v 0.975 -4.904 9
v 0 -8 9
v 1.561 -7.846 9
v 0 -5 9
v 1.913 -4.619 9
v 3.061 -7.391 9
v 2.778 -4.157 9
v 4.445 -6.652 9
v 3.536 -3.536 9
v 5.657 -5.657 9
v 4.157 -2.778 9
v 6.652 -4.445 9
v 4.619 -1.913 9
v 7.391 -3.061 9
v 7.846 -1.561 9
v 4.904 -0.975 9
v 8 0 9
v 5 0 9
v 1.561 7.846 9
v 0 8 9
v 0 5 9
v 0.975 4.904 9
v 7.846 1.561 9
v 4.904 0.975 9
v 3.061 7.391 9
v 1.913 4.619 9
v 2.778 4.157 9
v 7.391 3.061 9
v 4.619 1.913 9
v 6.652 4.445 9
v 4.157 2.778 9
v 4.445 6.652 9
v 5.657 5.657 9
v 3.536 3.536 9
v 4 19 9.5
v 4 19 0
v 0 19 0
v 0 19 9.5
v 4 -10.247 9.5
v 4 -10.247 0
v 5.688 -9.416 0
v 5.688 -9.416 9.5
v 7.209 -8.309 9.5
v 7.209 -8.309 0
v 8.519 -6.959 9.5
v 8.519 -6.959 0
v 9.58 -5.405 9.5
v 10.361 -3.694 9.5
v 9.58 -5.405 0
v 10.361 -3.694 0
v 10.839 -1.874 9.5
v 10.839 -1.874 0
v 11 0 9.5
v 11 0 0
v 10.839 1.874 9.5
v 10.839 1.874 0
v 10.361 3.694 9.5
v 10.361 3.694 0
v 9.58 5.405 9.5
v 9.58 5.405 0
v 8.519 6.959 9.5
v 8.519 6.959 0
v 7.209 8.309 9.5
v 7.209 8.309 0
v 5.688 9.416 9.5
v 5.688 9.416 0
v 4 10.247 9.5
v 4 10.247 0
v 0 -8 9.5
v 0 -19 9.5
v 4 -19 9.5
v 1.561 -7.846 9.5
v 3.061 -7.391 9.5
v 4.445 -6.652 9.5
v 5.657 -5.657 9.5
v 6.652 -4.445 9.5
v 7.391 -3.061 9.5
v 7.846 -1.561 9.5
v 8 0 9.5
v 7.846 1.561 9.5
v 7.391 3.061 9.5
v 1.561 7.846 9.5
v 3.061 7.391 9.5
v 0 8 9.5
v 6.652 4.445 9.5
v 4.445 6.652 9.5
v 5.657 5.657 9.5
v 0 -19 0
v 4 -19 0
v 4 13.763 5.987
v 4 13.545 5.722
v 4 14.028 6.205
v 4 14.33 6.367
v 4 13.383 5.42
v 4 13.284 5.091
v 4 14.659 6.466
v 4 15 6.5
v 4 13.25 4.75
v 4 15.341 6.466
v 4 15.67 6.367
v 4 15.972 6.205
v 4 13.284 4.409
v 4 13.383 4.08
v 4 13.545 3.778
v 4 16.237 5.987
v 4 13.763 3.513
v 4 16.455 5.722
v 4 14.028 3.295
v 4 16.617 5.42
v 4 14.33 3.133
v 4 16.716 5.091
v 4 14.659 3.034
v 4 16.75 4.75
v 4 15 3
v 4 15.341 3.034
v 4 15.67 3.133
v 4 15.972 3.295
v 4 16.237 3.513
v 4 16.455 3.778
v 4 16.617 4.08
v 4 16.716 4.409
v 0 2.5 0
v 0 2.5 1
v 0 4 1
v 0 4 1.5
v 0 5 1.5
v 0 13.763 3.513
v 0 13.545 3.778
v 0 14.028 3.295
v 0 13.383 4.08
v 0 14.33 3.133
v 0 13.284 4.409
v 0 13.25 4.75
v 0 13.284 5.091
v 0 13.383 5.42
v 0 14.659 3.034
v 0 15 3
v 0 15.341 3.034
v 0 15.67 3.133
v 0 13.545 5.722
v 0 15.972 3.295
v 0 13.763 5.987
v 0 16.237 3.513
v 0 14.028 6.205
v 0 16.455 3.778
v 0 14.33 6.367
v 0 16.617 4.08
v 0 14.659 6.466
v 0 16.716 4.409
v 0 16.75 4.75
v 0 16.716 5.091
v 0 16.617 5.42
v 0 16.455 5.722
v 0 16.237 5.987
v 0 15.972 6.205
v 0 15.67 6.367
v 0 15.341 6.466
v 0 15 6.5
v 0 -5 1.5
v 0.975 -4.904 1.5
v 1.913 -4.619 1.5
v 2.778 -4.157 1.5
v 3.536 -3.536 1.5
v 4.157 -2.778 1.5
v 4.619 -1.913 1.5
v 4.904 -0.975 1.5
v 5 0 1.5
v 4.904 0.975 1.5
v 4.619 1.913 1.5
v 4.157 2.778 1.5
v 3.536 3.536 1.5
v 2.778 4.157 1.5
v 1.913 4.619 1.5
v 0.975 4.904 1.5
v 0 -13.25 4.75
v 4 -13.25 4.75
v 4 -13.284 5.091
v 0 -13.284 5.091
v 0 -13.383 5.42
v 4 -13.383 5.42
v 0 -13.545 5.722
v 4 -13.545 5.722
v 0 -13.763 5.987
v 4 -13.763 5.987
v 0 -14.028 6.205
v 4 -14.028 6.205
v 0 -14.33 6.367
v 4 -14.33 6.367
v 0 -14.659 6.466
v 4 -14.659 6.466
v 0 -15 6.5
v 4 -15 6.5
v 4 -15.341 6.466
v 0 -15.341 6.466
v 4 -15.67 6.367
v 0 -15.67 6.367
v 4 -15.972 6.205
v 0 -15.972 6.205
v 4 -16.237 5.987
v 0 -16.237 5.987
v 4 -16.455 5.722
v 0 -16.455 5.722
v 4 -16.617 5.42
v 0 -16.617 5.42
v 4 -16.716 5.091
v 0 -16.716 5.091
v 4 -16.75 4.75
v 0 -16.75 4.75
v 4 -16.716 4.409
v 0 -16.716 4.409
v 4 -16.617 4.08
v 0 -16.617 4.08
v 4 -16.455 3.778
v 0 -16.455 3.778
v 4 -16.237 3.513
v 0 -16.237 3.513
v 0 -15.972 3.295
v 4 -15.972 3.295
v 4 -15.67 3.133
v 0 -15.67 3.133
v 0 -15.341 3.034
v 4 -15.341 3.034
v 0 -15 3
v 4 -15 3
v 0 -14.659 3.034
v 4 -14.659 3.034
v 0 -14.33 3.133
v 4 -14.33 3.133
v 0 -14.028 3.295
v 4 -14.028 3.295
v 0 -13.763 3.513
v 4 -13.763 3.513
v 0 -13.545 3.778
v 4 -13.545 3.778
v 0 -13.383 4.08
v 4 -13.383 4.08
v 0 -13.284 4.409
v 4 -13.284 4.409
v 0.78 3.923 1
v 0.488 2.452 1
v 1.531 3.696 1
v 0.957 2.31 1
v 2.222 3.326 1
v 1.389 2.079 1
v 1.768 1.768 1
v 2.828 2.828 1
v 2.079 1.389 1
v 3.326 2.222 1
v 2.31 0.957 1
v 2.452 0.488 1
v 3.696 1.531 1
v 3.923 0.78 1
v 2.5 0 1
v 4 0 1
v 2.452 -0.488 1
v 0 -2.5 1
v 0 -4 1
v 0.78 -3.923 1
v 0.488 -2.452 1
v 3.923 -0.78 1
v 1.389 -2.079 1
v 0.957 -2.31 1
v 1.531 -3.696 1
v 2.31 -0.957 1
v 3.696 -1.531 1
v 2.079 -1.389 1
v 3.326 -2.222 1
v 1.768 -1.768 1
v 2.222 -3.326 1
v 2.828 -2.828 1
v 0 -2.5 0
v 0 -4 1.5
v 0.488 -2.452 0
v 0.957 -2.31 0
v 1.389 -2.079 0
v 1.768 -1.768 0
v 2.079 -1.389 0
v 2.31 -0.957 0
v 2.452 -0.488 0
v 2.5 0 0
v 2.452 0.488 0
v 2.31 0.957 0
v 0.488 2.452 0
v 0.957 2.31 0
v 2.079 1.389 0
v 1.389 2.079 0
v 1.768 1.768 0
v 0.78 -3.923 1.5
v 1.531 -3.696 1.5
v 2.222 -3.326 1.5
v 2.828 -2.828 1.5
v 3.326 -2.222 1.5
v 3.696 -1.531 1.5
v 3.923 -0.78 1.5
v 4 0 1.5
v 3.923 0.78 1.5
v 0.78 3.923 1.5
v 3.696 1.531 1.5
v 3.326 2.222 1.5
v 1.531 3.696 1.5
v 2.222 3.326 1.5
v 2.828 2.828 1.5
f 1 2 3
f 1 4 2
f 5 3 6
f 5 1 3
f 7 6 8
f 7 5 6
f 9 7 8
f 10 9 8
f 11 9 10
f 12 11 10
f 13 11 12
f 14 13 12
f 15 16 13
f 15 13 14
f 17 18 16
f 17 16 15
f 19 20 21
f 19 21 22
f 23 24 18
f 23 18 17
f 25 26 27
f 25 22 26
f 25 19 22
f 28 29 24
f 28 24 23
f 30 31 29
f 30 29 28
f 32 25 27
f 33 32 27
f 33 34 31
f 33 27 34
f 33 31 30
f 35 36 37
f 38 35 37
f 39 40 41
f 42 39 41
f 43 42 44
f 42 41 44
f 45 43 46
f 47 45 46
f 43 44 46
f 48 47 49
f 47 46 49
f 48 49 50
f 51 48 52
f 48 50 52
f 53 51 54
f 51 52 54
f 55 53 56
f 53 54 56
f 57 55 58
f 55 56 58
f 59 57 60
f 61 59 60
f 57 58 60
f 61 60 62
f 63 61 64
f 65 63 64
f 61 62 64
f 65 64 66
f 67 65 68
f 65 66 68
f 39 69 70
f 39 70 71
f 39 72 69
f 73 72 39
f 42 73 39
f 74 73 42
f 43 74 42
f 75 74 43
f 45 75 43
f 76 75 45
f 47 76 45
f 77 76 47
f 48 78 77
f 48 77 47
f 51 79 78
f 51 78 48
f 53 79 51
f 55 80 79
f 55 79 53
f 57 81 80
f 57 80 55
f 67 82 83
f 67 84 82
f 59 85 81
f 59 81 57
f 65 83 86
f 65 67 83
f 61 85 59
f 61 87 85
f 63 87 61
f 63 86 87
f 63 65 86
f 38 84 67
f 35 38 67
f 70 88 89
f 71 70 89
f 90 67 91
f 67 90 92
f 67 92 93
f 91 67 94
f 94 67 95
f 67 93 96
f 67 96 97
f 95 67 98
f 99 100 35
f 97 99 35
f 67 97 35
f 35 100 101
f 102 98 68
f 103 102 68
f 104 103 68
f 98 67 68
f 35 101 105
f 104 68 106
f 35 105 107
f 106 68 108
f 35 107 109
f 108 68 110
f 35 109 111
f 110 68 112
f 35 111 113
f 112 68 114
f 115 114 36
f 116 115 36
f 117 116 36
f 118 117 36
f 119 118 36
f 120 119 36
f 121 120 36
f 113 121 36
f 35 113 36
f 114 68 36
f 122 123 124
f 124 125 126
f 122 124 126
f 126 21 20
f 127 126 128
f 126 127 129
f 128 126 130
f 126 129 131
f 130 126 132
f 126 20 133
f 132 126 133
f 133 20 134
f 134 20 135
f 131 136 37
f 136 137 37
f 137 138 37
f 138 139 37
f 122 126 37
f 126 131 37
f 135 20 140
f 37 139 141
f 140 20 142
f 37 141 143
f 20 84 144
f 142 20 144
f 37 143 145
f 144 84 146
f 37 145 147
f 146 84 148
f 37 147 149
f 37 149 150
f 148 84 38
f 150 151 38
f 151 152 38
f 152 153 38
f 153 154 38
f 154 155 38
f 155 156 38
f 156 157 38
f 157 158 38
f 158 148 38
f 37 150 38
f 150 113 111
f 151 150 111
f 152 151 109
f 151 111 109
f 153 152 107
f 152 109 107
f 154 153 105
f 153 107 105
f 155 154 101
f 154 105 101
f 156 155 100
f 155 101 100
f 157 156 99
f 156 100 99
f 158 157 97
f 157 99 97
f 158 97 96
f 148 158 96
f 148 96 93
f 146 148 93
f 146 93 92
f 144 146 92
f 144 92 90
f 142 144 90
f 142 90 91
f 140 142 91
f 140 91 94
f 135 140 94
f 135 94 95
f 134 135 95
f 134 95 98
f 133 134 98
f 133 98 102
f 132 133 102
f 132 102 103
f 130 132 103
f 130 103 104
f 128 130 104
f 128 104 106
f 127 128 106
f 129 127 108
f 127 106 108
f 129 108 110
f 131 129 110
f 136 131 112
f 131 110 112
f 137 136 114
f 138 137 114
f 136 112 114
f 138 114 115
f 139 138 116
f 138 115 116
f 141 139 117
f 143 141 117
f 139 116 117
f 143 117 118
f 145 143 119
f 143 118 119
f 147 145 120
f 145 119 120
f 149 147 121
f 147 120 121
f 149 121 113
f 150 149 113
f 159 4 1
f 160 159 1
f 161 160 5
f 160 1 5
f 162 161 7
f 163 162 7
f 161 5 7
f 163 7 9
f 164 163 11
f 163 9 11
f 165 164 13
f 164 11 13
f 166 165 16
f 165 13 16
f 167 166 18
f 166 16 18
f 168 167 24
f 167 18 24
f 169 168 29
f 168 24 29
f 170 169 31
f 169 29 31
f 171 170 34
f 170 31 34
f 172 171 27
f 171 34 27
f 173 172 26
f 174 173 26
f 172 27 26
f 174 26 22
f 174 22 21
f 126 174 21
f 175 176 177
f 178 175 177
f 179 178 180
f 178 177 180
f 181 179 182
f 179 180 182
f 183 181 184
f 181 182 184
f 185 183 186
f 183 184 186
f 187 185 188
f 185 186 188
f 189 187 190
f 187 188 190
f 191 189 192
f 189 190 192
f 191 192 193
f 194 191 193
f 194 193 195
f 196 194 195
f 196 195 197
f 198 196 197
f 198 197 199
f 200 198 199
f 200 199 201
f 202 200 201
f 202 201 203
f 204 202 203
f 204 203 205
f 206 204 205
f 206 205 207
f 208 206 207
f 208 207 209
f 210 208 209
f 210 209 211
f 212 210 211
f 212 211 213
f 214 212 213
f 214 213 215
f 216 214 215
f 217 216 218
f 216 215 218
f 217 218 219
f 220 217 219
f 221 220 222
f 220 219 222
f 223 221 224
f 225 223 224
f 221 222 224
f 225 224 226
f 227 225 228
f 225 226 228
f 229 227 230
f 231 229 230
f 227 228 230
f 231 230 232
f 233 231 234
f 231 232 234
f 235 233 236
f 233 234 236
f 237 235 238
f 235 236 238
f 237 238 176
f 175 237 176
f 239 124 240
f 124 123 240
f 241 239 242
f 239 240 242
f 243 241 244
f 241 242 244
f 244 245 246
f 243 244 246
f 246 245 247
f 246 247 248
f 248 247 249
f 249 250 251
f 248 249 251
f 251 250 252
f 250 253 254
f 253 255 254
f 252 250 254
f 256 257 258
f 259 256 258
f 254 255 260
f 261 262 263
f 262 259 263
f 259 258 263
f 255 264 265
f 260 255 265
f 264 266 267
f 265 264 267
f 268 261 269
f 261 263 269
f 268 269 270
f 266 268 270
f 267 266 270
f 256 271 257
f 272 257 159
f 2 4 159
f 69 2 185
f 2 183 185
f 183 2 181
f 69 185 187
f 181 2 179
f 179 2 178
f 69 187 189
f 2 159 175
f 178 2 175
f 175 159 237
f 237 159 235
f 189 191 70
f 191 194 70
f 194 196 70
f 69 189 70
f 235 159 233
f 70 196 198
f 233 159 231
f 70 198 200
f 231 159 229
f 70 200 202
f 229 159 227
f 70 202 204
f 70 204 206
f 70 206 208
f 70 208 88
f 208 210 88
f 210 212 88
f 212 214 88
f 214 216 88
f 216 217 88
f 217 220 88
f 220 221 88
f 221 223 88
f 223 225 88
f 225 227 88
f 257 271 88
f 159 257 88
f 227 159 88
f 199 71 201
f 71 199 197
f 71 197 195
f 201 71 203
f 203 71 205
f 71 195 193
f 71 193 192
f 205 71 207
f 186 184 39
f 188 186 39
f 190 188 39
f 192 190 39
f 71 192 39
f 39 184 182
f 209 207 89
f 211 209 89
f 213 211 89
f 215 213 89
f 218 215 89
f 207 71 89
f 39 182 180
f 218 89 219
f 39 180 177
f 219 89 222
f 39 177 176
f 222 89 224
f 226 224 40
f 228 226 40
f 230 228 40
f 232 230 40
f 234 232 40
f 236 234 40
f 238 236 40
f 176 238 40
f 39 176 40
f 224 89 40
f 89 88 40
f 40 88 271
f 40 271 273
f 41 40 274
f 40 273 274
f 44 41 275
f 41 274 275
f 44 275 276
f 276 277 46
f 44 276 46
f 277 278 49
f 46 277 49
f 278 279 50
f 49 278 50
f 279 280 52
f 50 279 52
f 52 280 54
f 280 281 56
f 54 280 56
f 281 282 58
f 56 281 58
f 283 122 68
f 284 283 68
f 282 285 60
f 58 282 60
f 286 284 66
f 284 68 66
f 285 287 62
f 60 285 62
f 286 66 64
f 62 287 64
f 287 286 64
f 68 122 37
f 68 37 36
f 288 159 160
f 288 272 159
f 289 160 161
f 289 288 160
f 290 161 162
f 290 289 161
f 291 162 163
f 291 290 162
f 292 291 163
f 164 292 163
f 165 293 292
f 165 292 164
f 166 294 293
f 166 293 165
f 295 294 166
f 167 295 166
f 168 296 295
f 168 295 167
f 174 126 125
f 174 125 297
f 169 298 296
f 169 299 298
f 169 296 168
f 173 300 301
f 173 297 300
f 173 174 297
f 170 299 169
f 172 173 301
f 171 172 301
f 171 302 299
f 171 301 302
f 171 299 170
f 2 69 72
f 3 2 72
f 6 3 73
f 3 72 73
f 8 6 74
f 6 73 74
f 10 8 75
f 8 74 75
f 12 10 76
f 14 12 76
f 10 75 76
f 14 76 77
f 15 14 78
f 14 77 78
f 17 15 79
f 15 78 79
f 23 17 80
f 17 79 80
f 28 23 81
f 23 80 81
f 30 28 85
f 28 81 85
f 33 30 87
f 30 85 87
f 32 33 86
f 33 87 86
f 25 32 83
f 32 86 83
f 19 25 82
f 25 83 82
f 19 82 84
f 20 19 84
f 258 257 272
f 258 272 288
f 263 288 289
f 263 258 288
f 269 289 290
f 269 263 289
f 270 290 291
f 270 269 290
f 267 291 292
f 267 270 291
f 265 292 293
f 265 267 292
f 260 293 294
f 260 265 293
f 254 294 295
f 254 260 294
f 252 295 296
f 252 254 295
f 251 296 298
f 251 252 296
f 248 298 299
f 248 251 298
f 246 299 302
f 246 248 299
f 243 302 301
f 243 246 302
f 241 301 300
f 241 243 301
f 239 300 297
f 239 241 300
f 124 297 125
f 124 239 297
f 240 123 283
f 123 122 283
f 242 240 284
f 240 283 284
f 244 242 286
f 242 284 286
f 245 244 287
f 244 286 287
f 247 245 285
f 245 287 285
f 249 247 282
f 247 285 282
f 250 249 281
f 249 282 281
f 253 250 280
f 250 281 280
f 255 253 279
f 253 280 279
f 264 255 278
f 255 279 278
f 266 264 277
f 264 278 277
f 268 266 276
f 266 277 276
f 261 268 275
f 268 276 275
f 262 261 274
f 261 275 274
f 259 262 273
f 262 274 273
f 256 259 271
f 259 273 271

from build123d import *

# Parameters (mm, degrees)
F0_R      = 11
F1_DEPTH  = 9.5
F2_R      = 8
F3_DEPTH  = 0.5
F4_R      = 5
F5_DEPTH  = 25
F6_R      = 5
F6_R_2    = 2.5
F7_DEPTH  = 1
F8_R      = 5
F8_R_2    = 4
F9_DEPTH  = 0.5
F10_W     = 63.0000028759
F10_H     = 42.9000016302
F11_DEPTH = 25
F13_DEPTH = 9.5
F14_R     = 1.75
F15_DEPTH = 25


with BuildPart() as f1:
    # F0 (on Top) → F1 (new body)
    with BuildSketch(Plane.XY):
        Circle(F0_R)
    extrude(amount=F1_DEPTH)

    # F2 (on face) → F3 (cut)
    with BuildSketch(Plane.XY.offset(9.5)):
        Circle(F2_R)
    extrude(amount=-F3_DEPTH, mode=Mode.SUBTRACT)

    # F4 (on face) → F5 (cut)
    with BuildSketch(Plane.XY.offset(9)):
        Circle(F4_R)
    extrude(amount=-F5_DEPTH, mode=Mode.SUBTRACT)

    # F6 (on face) → F7 (join)
    with BuildSketch(Plane(origin=(0, 0, 0), x_dir=(1, 0, 0), z_dir=(0, 0, -1))):
        Circle(F6_R)
        Circle(F6_R_2, mode=Mode.SUBTRACT)
    extrude(amount=-F7_DEPTH)

    # F8 (on face) → F9 (join)
    with BuildSketch(Plane.XY.offset(1)):
        Circle(F8_R)
        Circle(F8_R_2, mode=Mode.SUBTRACT)
    extrude(amount=F9_DEPTH)

    # F10 (on Right) → F11 (cut)
    with BuildSketch(Plane.YZ):
        with Locations((3.45000159, 3.6000004038)):
            Rectangle(F10_W, F10_H)
    extrude(amount=-F11_DEPTH, mode=Mode.SUBTRACT)

    # F12 (on Top) → F13 (join)
    with BuildSketch(Plane.XY):
        with BuildLine():
            ThreePointArc((4, -10.246950766), (2.0351340956, -10.810098483), (0, -11))
            Line((0, -11), (0, -19))
            Line((0, -19), (4, -19))
            Line((4, -19), (4, -10.246950766))
        make_face()
        with BuildLine():
            Line((0, 19), (0, 11))
            ThreePointArc((0, 11), (2.0351340956, 10.810098483), (4, 10.246950766))
            Line((4, 10.246950766), (4, 19))
            Line((4, 19), (0, 19))
        make_face()
    extrude(amount=F13_DEPTH)

    # F14 (on face) → F15 (cut)
    with BuildSketch(Plane.YZ.offset(4)):
        with Locations((-15, 4.75)):
            Circle(F14_R)
        with Locations((15, 4.75)):
            Circle(F14_R)
    extrude(amount=-F15_DEPTH, mode=Mode.SUBTRACT)


solid = f1.part
